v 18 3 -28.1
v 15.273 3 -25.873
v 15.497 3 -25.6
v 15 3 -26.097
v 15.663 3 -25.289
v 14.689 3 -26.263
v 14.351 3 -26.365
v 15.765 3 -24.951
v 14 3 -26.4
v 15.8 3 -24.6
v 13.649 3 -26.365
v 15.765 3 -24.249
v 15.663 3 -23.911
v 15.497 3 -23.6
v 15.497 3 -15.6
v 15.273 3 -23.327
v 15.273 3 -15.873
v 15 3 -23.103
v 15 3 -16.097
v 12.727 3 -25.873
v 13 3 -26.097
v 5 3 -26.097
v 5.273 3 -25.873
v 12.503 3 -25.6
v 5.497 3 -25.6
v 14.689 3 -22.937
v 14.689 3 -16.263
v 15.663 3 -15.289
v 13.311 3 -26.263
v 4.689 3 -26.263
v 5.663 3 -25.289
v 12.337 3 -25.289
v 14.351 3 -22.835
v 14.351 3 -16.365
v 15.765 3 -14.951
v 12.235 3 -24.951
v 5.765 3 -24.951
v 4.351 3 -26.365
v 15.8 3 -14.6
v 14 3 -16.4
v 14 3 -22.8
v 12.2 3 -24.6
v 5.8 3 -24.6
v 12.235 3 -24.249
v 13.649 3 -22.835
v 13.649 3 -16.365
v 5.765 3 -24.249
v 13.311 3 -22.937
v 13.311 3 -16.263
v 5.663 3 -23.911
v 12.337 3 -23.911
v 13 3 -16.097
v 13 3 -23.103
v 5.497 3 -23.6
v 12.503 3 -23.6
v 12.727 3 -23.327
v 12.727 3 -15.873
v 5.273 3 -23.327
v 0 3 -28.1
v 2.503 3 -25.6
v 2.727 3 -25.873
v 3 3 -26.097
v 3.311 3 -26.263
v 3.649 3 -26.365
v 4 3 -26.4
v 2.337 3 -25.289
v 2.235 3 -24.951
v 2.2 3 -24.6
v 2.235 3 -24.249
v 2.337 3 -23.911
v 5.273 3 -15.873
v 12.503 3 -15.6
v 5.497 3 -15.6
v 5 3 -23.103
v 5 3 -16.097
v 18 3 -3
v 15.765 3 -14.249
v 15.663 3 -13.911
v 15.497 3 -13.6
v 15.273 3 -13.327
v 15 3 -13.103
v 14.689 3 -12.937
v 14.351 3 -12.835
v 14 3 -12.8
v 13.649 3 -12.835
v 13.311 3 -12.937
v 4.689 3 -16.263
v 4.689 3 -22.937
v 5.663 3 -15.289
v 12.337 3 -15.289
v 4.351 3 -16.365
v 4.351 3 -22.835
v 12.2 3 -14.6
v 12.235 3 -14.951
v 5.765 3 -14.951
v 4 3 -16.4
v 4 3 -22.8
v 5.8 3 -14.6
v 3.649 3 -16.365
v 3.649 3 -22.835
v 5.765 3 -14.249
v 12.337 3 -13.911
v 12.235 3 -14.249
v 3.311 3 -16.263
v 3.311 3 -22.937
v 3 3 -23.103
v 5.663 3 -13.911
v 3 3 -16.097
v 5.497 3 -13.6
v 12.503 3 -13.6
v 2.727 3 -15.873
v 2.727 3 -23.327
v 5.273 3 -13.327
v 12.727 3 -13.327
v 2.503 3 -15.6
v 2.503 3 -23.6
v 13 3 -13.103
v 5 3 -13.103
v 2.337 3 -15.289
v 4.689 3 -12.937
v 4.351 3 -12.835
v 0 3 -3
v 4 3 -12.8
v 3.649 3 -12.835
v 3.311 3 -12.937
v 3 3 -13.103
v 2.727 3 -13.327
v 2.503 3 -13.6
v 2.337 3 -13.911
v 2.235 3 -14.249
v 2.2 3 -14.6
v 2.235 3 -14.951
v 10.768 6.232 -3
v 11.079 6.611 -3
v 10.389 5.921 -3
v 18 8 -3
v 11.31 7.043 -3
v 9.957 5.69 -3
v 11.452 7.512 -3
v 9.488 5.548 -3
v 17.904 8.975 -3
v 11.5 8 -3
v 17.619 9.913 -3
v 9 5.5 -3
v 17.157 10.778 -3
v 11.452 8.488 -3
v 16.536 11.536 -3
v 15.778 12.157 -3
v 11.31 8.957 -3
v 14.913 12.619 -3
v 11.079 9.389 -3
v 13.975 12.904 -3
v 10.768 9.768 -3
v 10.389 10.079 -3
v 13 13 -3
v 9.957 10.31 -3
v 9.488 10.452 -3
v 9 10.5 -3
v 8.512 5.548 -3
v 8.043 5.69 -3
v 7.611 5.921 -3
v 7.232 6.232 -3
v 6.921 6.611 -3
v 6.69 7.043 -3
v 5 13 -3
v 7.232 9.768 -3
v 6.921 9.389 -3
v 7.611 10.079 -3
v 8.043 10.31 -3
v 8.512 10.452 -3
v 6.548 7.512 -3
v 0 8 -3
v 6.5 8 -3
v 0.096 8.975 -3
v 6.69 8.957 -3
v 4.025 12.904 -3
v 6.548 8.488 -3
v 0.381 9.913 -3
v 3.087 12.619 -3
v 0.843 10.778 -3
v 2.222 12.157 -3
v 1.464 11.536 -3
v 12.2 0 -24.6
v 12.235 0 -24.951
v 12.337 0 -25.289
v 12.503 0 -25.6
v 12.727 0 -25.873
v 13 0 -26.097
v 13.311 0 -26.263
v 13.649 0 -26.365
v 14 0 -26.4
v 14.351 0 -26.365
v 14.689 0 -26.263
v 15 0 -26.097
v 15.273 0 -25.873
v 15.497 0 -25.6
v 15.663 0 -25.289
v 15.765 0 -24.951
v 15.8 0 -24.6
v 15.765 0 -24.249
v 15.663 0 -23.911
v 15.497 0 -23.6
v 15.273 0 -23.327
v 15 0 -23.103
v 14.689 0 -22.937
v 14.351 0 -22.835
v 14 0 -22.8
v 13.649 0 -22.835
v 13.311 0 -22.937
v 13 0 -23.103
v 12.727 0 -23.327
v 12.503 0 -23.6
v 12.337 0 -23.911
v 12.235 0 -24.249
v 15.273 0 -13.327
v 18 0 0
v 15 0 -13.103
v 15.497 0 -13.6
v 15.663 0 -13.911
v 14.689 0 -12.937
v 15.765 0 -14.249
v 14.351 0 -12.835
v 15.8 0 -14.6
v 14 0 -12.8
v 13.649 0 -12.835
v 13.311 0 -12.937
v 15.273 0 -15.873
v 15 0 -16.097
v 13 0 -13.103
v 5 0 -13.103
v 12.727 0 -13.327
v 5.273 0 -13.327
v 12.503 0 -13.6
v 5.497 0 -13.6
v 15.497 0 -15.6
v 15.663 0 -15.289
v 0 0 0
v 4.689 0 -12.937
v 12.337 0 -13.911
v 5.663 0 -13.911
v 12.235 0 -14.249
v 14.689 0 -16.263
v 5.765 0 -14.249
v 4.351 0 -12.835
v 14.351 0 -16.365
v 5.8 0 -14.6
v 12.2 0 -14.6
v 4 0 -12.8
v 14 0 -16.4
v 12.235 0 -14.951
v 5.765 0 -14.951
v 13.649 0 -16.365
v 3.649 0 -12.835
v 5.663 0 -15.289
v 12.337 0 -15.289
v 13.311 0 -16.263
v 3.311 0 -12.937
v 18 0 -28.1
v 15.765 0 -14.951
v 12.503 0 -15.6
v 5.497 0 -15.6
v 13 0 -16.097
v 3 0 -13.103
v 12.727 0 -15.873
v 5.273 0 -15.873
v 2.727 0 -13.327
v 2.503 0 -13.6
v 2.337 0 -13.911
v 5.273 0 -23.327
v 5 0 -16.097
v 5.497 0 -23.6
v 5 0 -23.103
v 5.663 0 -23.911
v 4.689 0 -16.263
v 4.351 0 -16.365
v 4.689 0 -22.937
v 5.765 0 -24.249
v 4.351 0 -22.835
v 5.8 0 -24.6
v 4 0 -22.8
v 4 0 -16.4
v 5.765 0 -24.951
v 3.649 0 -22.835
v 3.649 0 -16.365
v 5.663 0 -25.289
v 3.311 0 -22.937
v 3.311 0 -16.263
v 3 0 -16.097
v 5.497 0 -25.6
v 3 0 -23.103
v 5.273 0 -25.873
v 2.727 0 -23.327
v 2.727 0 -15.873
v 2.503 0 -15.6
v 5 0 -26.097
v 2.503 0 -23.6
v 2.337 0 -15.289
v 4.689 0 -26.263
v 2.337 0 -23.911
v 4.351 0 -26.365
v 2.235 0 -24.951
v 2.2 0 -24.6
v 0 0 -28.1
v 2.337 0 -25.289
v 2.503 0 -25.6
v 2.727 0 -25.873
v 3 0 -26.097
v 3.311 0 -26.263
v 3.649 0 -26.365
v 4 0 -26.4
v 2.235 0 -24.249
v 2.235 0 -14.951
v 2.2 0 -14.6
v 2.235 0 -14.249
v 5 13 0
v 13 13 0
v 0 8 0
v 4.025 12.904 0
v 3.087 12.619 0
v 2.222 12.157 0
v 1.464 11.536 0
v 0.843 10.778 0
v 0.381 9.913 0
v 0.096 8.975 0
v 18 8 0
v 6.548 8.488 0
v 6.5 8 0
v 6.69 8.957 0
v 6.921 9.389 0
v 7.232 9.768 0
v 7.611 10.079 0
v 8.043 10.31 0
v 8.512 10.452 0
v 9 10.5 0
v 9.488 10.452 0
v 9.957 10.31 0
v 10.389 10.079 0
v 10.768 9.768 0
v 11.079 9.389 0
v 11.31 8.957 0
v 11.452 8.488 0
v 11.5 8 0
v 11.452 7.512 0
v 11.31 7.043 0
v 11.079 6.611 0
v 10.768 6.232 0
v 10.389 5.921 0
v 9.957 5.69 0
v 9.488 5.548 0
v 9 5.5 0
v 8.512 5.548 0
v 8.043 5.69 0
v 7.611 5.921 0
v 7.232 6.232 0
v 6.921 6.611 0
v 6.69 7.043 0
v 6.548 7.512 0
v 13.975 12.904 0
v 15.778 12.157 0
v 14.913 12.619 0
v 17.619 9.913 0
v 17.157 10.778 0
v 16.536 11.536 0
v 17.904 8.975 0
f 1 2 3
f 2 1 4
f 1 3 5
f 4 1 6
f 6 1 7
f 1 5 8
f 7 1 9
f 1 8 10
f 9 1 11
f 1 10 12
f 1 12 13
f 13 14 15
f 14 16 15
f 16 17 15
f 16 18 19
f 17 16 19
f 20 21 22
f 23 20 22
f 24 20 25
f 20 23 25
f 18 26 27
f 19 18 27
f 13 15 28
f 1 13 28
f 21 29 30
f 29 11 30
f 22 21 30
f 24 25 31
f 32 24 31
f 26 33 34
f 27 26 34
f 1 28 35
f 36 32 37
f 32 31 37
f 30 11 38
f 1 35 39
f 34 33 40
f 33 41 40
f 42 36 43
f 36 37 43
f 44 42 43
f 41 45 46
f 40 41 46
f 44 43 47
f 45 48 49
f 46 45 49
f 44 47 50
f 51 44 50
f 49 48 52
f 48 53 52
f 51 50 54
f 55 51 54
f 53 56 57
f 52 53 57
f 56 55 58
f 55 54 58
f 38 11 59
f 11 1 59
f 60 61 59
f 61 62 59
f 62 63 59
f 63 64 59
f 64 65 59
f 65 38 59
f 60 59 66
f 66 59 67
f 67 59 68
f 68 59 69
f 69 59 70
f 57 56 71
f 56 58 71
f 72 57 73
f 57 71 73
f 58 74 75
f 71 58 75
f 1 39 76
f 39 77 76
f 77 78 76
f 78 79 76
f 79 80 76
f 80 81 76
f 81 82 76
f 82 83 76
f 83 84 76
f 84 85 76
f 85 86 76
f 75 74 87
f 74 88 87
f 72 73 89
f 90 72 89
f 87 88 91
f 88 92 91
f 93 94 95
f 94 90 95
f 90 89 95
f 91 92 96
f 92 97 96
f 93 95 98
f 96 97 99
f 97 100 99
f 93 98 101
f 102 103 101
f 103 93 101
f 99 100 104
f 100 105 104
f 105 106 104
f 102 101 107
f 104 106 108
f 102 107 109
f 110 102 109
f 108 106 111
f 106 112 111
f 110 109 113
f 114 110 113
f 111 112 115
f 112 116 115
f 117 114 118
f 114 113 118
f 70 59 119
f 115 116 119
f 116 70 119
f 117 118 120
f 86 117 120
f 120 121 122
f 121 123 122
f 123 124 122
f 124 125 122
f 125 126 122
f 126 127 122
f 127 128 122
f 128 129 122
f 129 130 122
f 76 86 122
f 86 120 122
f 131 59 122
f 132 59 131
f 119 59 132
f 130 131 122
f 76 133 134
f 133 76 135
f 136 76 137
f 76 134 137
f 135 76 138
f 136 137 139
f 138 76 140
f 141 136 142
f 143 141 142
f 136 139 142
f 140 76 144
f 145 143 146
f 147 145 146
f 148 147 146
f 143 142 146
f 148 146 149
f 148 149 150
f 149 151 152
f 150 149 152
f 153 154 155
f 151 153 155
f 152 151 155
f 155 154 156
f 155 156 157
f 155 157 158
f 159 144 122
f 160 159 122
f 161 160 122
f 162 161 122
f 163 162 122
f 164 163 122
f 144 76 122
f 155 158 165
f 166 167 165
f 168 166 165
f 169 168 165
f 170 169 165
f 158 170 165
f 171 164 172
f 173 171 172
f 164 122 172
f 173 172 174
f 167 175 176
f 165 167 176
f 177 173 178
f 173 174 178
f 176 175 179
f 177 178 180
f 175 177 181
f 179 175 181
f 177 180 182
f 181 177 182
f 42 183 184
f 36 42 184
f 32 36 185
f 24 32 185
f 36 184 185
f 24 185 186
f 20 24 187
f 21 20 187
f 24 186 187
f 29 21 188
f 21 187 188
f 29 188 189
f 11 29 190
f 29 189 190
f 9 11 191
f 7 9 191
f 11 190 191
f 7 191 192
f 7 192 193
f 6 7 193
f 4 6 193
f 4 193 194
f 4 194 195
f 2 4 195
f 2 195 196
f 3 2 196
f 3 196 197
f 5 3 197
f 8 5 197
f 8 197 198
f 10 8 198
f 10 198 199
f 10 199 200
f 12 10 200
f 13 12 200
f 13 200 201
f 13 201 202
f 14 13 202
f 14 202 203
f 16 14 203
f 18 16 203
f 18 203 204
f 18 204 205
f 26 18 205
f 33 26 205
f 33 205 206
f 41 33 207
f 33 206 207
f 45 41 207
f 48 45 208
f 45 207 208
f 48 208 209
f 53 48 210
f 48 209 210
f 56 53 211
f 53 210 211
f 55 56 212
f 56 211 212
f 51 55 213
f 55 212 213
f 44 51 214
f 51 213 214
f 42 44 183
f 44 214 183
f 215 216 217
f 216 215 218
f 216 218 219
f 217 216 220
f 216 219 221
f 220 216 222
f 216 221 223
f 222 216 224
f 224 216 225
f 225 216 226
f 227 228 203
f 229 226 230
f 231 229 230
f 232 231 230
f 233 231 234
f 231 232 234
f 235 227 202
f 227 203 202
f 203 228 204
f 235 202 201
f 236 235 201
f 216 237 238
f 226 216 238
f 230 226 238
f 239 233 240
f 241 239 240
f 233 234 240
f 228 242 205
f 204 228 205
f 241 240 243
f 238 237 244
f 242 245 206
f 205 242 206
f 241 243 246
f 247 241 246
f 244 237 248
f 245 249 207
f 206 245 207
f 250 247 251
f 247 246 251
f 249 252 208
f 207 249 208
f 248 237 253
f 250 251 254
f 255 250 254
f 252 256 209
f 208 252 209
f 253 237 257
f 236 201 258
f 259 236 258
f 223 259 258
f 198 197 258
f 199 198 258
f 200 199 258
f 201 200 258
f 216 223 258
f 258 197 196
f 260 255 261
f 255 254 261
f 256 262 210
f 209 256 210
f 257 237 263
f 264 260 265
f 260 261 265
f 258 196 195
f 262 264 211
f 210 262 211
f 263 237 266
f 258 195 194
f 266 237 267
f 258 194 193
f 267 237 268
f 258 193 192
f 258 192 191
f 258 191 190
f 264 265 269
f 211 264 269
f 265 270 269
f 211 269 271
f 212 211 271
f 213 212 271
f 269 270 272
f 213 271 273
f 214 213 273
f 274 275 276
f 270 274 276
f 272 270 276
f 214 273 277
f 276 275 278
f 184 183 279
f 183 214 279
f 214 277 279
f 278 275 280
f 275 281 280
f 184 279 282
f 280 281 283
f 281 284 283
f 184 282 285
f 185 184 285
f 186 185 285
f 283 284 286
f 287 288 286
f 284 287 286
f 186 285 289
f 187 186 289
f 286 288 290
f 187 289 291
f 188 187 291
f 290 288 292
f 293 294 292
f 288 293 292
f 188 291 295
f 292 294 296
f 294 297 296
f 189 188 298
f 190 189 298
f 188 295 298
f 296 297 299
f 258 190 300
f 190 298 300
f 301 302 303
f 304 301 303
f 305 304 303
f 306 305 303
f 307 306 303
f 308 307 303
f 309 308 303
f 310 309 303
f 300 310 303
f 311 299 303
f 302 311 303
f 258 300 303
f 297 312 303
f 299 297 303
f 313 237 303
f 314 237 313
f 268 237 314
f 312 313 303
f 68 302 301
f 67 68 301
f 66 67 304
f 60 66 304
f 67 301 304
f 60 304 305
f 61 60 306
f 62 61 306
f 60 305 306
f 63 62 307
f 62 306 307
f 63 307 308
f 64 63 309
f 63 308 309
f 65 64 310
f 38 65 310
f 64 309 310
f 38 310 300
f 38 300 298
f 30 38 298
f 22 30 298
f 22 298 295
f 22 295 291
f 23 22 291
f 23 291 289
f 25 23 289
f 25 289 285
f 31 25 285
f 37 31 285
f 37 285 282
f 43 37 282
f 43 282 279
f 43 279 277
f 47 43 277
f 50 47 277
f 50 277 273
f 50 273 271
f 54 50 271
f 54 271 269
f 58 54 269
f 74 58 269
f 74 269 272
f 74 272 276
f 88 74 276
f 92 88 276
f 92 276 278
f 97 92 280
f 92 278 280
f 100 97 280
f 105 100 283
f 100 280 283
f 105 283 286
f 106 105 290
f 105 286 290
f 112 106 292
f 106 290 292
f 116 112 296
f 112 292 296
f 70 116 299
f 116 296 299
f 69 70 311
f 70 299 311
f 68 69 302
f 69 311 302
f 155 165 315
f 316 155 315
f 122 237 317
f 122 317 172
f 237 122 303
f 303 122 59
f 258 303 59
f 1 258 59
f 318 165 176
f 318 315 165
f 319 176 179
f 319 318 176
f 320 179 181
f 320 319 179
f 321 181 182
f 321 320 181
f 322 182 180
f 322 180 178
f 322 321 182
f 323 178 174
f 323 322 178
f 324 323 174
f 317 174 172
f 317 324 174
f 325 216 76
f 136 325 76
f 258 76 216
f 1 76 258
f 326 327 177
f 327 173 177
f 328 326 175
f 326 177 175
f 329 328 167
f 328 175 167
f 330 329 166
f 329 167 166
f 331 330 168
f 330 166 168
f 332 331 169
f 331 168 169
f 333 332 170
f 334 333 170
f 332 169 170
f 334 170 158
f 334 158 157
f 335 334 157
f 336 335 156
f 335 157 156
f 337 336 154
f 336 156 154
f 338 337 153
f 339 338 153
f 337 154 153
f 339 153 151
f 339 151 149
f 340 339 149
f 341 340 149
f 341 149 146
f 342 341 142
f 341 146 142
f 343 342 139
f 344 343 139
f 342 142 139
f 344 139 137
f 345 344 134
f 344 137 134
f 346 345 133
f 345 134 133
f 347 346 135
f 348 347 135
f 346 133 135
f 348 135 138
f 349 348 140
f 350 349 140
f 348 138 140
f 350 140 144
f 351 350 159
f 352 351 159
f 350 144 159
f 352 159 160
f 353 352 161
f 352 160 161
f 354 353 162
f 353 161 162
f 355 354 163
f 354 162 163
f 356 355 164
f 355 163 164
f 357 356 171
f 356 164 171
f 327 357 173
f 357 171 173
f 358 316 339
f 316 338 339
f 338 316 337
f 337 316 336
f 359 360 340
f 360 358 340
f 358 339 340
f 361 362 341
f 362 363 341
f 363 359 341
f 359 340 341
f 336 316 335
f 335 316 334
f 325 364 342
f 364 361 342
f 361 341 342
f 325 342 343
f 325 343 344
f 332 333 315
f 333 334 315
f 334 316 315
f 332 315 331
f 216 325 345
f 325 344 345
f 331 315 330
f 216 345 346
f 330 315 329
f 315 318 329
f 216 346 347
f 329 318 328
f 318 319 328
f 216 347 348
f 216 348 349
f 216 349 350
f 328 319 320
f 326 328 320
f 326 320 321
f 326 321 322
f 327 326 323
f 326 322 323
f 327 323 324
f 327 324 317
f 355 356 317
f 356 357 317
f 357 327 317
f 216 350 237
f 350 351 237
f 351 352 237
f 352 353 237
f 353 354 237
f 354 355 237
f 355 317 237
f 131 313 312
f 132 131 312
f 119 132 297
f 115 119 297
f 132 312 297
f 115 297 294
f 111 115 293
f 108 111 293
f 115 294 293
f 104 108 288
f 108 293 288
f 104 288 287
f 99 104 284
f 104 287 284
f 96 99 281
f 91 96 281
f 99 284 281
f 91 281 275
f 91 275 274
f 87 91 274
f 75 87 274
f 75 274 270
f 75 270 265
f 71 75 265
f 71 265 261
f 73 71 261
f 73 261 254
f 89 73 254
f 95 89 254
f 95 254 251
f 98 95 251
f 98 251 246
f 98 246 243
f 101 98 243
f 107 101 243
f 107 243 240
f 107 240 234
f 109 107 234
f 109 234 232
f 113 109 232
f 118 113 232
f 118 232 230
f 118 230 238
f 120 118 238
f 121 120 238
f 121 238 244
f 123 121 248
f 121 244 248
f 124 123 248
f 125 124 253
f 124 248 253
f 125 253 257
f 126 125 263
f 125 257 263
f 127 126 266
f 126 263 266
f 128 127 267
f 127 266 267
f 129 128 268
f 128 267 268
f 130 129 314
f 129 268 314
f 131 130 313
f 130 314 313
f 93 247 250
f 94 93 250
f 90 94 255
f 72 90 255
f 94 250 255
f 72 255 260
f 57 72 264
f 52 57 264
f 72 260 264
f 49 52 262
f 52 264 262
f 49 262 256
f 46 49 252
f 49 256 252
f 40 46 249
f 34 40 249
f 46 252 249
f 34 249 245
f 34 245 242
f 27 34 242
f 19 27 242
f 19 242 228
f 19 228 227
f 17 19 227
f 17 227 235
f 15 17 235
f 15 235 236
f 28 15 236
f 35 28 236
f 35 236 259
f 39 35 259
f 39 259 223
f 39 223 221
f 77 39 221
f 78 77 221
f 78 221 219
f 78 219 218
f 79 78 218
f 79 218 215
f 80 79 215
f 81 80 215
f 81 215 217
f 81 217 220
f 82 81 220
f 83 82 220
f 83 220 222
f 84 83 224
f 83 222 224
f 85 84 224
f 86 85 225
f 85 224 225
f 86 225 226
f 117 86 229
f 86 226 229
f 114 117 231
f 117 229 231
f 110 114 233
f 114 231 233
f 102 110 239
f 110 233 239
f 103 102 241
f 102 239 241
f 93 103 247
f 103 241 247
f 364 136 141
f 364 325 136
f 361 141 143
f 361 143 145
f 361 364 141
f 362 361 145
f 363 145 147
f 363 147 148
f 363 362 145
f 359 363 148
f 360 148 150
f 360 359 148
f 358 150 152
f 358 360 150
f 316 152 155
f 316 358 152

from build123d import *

# Parameters (mm, degrees)
BOSS_EXTRUDE1_DEPTH       = 18
F_5_0MM_DOWEL_HOLE1_D     = 5
F_5_0MM_DOWEL_HOLE1_DEPTH = 3
F_5_0MM_DOWEL_HOLE1_TIP   = 1.502151548
FILLET1_R                 = 5
M3_CLEARANCE_HOLE1_D      = 3.6


with BuildPart() as part:
    # Sketch1 → Boss-Extrude1 (new body)
    with BuildSketch(Plane(origin=(0, 0, 0), x_dir=(0, 0, -1), z_dir=(1, 0, 0))):
        Polygon((0, 0), (28.1, 0), (28.1, 3), (3, 3), (3, 13), (0, 13), align=None)
    extrude(amount=BOSS_EXTRUDE1_DEPTH)

    # Ø5.0mm Dowel Hole1
    with Locations(Plane.XY):
        with Locations((9, 8)):
            Hole(F_5_0MM_DOWEL_HOLE1_D / 2, depth=F_5_0MM_DOWEL_HOLE1_DEPTH)
            with Locations((0, 0, -(F_5_0MM_DOWEL_HOLE1_DEPTH + F_5_0MM_DOWEL_HOLE1_TIP / 2))):  # 118° drill point
                Cone(0, F_5_0MM_DOWEL_HOLE1_D / 2, F_5_0MM_DOWEL_HOLE1_TIP, mode=Mode.SUBTRACT)

    # Fillet1
    fillet1_edges = [part.edges().sort_by_distance(p)[0] for p in [
        (18, 13, -1.5),
        (0, 13, -1.5),
    ]]
    fillet(fillet1_edges, radius=FILLET1_R)

    # M3 Clearance Hole1 (through all)
    with Locations(Plane(origin=(0, 3, 0), x_dir=(1, 0, 0), z_dir=(0, 1, 0))):
        with Locations((14, 24.6), (4, 24.6), (4, 14.6), (14, 14.6)):
            Hole(M3_CLEARANCE_HOLE1_D / 2)


solid = part.part
